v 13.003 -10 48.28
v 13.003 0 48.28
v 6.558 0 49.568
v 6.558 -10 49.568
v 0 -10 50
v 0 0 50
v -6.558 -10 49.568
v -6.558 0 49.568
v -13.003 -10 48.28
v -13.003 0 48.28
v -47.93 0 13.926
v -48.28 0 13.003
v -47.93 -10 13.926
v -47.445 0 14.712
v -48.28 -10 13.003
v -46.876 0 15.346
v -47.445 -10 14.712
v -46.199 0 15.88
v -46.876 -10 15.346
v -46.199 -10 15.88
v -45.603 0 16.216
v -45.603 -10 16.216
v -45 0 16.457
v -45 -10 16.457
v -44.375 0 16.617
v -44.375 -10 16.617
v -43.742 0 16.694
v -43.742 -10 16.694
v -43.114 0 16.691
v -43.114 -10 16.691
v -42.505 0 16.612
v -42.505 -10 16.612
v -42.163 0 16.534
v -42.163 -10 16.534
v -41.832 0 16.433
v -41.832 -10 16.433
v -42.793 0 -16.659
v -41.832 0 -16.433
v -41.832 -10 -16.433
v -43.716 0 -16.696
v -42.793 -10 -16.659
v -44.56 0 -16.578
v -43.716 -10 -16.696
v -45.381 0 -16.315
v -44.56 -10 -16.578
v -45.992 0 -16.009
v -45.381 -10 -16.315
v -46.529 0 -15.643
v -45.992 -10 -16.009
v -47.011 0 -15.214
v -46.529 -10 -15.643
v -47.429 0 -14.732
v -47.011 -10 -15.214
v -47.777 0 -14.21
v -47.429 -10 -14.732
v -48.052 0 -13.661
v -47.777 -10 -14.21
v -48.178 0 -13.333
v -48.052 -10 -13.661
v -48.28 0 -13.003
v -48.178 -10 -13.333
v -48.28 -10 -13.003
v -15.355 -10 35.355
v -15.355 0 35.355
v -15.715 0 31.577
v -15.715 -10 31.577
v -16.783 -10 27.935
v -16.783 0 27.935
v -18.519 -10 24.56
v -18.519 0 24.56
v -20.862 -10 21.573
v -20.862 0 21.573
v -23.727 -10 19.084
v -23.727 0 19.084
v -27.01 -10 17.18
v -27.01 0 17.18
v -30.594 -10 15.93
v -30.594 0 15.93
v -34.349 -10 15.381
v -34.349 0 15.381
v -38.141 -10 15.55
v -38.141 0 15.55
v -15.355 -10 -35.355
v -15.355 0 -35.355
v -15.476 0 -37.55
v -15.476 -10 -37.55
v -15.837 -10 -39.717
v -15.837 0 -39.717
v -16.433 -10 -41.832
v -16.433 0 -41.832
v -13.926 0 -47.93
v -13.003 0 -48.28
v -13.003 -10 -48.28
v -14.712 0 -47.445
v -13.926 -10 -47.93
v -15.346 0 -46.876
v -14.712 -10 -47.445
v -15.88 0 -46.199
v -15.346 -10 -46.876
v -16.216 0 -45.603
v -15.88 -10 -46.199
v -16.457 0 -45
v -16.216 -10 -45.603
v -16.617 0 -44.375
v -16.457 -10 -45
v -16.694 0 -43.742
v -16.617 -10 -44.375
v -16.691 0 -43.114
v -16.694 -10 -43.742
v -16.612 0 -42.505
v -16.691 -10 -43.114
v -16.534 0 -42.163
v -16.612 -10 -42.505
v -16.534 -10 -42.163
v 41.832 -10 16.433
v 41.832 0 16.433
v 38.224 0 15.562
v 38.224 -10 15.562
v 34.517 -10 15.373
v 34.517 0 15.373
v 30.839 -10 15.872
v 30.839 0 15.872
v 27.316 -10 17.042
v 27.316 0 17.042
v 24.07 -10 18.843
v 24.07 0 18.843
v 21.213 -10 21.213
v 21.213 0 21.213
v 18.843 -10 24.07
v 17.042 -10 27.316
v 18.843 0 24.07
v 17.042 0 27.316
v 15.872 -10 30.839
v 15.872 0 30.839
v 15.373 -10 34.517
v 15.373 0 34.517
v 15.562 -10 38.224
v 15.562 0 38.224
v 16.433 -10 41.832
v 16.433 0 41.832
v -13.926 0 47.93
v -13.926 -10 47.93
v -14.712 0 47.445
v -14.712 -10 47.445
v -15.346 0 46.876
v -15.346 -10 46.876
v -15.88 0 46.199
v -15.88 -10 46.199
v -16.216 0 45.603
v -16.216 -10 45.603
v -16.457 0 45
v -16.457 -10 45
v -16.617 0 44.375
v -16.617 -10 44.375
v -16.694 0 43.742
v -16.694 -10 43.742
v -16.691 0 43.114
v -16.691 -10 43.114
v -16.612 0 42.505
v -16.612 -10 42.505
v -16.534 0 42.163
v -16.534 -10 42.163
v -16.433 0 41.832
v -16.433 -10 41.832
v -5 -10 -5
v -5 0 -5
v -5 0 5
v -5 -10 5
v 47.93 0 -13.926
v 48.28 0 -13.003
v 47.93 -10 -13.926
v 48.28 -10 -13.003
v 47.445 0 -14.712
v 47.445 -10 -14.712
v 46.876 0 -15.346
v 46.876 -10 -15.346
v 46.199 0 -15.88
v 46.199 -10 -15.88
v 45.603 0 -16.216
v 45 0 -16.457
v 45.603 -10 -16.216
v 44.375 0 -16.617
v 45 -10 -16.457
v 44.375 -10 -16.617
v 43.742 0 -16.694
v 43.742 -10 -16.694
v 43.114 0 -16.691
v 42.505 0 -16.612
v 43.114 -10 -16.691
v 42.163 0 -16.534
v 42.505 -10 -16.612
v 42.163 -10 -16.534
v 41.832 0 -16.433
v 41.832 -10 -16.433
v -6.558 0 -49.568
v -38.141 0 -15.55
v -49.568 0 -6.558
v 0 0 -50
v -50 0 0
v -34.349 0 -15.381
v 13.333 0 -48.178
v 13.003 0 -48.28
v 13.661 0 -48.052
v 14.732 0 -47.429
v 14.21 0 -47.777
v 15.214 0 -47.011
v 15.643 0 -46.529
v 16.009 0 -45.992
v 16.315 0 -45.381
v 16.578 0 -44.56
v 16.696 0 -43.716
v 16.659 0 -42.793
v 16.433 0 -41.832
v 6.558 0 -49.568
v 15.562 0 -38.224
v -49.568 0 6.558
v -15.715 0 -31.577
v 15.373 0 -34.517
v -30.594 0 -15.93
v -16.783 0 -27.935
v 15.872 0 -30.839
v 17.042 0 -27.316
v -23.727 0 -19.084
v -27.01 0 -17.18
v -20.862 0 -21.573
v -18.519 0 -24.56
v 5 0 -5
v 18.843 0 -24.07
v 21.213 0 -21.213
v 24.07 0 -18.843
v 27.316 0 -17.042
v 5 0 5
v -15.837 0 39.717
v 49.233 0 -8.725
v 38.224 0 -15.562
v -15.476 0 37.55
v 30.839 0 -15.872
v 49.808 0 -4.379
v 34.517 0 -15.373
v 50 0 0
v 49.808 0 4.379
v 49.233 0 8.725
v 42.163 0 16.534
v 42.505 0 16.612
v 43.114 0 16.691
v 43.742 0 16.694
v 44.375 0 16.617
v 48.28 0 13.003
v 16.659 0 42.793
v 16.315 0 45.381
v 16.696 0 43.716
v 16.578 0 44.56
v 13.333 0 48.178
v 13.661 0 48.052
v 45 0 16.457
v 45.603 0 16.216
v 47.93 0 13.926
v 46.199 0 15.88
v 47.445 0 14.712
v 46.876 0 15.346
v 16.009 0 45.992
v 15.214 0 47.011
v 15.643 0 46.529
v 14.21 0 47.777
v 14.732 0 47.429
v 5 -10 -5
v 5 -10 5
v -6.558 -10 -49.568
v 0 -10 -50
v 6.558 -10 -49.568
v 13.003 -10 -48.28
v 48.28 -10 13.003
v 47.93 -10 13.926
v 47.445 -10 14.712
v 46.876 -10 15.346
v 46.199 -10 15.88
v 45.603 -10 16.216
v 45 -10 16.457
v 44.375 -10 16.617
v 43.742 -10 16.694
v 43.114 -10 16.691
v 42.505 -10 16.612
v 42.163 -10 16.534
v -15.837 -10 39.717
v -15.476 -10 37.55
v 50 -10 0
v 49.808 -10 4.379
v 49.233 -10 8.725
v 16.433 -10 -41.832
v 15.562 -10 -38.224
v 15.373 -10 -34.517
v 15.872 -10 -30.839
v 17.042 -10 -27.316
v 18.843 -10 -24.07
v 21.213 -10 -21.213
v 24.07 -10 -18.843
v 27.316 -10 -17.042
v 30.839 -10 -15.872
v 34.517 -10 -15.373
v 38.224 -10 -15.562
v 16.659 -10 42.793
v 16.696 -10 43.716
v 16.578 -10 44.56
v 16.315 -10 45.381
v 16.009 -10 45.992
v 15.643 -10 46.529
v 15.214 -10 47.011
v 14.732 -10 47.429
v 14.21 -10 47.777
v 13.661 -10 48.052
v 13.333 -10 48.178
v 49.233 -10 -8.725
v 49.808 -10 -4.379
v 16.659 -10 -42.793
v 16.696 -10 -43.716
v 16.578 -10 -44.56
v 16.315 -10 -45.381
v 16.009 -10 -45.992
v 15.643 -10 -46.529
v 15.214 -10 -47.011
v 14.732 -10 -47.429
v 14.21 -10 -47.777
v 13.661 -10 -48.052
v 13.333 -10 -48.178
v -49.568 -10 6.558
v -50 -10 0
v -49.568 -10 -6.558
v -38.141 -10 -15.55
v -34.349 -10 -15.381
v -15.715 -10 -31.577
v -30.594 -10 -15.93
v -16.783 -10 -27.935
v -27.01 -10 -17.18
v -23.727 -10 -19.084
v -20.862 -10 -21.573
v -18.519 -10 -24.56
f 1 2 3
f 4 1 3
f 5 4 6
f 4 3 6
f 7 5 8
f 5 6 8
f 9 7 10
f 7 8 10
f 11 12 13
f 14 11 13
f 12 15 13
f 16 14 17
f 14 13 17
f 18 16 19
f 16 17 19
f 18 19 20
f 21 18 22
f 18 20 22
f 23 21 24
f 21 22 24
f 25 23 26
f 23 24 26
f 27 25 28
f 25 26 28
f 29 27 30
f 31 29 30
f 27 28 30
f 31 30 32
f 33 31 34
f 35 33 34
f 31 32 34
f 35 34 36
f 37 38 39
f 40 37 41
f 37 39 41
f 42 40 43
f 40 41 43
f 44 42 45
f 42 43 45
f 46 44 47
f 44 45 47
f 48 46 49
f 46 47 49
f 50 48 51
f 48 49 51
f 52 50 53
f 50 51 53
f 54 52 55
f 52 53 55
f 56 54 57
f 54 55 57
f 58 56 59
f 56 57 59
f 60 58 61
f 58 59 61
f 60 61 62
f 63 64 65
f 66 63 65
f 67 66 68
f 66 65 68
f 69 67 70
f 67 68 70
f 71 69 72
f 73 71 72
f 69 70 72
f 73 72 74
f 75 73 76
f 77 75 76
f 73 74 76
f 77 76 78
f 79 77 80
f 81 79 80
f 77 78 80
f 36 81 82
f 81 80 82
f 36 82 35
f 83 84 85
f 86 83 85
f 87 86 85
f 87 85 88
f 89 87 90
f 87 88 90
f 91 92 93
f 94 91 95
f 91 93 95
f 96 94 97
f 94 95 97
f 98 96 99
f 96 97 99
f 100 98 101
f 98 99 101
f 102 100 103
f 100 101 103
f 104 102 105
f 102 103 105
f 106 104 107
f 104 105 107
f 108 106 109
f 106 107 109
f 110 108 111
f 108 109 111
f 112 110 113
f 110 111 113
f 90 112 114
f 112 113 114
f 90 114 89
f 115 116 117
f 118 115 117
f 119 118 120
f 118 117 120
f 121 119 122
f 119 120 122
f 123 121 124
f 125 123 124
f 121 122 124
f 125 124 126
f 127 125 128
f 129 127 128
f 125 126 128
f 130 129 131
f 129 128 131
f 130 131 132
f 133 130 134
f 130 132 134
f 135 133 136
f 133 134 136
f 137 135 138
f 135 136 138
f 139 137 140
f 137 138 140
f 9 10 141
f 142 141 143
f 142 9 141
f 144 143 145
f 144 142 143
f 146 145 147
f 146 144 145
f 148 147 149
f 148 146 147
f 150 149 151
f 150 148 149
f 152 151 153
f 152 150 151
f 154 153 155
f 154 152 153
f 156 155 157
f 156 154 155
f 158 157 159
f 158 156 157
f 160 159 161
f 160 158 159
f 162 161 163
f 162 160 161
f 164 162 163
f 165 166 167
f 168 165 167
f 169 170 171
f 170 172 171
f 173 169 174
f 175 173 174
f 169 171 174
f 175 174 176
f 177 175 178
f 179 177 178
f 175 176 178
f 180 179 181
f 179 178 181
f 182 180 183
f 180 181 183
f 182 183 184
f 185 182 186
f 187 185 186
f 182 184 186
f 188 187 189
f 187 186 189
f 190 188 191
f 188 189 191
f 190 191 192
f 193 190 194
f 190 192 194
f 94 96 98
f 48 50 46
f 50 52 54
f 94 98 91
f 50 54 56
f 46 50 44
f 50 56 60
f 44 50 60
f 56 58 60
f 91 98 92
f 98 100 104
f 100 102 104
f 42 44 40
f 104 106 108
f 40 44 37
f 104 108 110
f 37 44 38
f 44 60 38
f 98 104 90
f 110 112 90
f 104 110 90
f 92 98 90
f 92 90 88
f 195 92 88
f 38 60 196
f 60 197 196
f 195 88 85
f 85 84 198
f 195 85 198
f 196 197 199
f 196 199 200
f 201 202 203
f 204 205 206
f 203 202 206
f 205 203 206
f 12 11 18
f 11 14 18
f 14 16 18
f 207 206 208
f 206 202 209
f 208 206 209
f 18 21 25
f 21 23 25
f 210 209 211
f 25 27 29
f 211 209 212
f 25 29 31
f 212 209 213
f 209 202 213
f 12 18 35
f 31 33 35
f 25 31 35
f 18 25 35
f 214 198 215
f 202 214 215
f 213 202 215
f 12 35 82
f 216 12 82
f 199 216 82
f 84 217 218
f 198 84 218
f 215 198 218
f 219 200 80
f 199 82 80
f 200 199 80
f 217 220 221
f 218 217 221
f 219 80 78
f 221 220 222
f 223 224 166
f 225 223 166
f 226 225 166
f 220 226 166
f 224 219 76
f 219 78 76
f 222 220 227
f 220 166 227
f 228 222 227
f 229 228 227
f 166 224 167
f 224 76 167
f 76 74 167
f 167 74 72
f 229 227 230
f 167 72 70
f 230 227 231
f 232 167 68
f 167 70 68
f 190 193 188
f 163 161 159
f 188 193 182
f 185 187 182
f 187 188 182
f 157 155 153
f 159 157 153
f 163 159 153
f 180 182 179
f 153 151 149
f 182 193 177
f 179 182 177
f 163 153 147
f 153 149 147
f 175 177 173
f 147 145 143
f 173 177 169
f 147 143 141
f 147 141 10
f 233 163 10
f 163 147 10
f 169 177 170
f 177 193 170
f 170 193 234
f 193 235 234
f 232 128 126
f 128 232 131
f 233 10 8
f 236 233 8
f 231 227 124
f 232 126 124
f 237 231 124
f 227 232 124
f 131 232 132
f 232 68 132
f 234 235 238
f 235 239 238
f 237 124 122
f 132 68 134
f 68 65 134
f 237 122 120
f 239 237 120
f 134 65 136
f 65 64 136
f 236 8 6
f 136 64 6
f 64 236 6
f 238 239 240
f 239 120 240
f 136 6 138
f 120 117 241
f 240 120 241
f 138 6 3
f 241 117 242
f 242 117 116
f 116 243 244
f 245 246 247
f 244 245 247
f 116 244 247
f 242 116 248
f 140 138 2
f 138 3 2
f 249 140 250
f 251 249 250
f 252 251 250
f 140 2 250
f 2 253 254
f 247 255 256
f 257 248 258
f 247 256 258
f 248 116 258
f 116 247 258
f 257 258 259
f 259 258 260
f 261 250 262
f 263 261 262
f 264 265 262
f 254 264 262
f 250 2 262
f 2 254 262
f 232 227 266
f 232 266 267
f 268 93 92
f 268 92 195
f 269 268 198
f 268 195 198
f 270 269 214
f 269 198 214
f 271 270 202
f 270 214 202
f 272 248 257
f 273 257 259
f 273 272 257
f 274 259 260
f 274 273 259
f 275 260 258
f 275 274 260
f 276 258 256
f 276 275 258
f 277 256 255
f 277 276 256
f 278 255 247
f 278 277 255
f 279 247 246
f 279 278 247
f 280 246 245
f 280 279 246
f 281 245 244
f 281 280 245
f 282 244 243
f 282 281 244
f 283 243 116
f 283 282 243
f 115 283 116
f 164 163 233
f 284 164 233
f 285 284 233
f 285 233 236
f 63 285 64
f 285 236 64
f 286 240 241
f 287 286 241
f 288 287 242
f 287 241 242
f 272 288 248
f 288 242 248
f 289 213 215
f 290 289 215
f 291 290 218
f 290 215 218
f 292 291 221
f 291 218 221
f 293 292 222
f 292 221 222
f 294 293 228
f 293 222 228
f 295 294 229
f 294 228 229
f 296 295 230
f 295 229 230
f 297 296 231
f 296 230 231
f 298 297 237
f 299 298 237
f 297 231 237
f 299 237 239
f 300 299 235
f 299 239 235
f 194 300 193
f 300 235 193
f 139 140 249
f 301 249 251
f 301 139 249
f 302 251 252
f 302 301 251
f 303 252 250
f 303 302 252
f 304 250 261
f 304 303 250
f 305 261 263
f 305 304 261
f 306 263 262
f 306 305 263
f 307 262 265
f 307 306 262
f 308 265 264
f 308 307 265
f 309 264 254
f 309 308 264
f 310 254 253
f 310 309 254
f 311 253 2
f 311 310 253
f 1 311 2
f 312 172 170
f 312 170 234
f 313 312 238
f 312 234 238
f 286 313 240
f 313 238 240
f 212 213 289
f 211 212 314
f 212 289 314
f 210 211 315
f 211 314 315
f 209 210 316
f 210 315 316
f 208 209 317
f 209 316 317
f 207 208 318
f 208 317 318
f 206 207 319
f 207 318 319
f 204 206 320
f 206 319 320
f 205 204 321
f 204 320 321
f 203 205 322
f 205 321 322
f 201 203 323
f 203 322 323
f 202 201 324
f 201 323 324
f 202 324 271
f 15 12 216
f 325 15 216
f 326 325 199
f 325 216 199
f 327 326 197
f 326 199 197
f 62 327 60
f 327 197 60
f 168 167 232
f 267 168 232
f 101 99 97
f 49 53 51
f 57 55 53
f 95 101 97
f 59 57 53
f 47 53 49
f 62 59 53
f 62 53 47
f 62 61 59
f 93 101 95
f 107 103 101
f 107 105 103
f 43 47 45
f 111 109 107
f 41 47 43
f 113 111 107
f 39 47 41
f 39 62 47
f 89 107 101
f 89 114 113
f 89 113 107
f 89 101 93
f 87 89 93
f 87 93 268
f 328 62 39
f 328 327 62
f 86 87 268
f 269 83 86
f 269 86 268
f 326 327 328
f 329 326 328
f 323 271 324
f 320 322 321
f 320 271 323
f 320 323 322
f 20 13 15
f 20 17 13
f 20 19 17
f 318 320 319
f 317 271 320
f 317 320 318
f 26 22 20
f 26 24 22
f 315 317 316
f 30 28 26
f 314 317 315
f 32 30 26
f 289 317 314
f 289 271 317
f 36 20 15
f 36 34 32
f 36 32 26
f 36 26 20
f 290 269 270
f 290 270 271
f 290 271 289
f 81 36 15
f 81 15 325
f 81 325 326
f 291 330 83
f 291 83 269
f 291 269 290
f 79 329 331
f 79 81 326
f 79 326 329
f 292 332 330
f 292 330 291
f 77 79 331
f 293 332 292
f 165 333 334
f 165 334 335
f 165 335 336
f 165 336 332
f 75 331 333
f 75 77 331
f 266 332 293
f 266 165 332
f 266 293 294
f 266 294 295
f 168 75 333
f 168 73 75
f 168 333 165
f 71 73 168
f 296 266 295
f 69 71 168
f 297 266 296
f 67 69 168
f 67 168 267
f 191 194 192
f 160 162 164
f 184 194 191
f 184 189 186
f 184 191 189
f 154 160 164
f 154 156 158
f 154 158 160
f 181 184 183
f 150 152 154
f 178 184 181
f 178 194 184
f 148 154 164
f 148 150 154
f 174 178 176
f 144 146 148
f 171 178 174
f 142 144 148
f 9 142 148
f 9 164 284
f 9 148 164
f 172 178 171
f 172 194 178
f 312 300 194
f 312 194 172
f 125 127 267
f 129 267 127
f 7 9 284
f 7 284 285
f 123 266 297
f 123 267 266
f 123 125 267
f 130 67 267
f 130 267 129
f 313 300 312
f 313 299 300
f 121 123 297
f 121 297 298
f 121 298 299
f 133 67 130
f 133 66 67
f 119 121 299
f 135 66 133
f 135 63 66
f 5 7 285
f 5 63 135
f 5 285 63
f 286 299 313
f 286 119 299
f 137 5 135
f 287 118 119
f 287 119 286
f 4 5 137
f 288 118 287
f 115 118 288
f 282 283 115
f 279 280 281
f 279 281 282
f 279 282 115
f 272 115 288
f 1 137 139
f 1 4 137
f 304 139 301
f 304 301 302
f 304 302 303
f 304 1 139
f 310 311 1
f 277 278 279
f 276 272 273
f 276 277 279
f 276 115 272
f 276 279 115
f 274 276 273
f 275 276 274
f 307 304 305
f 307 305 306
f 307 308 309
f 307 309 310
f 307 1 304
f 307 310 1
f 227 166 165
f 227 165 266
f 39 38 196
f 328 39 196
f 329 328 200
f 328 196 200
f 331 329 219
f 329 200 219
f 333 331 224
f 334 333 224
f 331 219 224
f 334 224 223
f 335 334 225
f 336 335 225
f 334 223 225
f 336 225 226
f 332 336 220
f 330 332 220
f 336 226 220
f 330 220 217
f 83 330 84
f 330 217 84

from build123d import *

# Parameters (mm, degrees)
F0_W     = 10
F0_H     = 10
F1_DEPTH = 10
F2_R     = 5
F3_R     = 5


with BuildPart() as f1:
    # F0 (on Front) → F1 (new body)
    with BuildSketch(Plane.XZ):
        with BuildLine():
            ThreePointArc((46.3833183951, -18.670505474), (49.0875030927, -9.5087875211), (50, 0))
            ThreePointArc((50, 0), (49.0875030927, 9.5087875211), (46.3833183951, 18.670505474))
            ThreePointArc((46.3833183951, 18.670505474), (21.2132034356, 21.2132034356), (18.670505474, 46.3833183951))
            ThreePointArc((18.670505474, 46.3833183951), (0, 50), (-18.670505474, 46.3833183951))
            ThreePointArc((-18.670505474, 46.3833183951), (-16.2020538097, 41.113087243), (-15.3553390593, 35.3553390593))
            ThreePointArc((-15.3553390593, 35.3553390593), (-25.8832639624, 17.7405783923), (-46.3833183951, 18.670505474))
            ThreePointArc((-46.3833183951, 18.670505474), (-50, 0), (-46.3833183951, -18.670505474))
            ThreePointArc((-46.3833183951, -18.670505474), (-25.8832639624, -17.7405783923), (-15.3553390593, -35.3553390593))
            ThreePointArc((-15.3553390593, -35.3553390593), (-16.2020538097, -41.113087243), (-18.670505474, -46.3833183951))
            ThreePointArc((-18.670505474, -46.3833183951), (0, -50), (18.670505474, -46.3833183951))
            ThreePointArc((18.670505474, -46.3833183951), (21.2132034356, -21.2132034356), (46.3833183951, -18.670505474))
        make_face()
        Rectangle(F0_W, F0_H, mode=Mode.SUBTRACT)
    extrude(amount=F1_DEPTH)

    # F2
    f2_edges = [f1.edges().sort_by_distance(p)[0] for p in [
        (-46.383318, -5, 18.670505),
        (-18.670505, -5, 46.383318),
        (46.383318, -5, 18.670505),
        (18.670505, -5, 46.383318),
    ]]
    fillet(f2_edges, radius=F2_R)

    # F3
    f3_edges = [f1.edges().sort_by_distance(p)[0] for p in [
        (-18.670505, -5, -46.383318),
        (-46.383318, -5, -18.670505),
        (18.670505, -5, -46.383318),
        (46.383318, -5, -18.670505),
    ]]
    fillet(f3_edges, radius=F3_R)


solid = f1.part
